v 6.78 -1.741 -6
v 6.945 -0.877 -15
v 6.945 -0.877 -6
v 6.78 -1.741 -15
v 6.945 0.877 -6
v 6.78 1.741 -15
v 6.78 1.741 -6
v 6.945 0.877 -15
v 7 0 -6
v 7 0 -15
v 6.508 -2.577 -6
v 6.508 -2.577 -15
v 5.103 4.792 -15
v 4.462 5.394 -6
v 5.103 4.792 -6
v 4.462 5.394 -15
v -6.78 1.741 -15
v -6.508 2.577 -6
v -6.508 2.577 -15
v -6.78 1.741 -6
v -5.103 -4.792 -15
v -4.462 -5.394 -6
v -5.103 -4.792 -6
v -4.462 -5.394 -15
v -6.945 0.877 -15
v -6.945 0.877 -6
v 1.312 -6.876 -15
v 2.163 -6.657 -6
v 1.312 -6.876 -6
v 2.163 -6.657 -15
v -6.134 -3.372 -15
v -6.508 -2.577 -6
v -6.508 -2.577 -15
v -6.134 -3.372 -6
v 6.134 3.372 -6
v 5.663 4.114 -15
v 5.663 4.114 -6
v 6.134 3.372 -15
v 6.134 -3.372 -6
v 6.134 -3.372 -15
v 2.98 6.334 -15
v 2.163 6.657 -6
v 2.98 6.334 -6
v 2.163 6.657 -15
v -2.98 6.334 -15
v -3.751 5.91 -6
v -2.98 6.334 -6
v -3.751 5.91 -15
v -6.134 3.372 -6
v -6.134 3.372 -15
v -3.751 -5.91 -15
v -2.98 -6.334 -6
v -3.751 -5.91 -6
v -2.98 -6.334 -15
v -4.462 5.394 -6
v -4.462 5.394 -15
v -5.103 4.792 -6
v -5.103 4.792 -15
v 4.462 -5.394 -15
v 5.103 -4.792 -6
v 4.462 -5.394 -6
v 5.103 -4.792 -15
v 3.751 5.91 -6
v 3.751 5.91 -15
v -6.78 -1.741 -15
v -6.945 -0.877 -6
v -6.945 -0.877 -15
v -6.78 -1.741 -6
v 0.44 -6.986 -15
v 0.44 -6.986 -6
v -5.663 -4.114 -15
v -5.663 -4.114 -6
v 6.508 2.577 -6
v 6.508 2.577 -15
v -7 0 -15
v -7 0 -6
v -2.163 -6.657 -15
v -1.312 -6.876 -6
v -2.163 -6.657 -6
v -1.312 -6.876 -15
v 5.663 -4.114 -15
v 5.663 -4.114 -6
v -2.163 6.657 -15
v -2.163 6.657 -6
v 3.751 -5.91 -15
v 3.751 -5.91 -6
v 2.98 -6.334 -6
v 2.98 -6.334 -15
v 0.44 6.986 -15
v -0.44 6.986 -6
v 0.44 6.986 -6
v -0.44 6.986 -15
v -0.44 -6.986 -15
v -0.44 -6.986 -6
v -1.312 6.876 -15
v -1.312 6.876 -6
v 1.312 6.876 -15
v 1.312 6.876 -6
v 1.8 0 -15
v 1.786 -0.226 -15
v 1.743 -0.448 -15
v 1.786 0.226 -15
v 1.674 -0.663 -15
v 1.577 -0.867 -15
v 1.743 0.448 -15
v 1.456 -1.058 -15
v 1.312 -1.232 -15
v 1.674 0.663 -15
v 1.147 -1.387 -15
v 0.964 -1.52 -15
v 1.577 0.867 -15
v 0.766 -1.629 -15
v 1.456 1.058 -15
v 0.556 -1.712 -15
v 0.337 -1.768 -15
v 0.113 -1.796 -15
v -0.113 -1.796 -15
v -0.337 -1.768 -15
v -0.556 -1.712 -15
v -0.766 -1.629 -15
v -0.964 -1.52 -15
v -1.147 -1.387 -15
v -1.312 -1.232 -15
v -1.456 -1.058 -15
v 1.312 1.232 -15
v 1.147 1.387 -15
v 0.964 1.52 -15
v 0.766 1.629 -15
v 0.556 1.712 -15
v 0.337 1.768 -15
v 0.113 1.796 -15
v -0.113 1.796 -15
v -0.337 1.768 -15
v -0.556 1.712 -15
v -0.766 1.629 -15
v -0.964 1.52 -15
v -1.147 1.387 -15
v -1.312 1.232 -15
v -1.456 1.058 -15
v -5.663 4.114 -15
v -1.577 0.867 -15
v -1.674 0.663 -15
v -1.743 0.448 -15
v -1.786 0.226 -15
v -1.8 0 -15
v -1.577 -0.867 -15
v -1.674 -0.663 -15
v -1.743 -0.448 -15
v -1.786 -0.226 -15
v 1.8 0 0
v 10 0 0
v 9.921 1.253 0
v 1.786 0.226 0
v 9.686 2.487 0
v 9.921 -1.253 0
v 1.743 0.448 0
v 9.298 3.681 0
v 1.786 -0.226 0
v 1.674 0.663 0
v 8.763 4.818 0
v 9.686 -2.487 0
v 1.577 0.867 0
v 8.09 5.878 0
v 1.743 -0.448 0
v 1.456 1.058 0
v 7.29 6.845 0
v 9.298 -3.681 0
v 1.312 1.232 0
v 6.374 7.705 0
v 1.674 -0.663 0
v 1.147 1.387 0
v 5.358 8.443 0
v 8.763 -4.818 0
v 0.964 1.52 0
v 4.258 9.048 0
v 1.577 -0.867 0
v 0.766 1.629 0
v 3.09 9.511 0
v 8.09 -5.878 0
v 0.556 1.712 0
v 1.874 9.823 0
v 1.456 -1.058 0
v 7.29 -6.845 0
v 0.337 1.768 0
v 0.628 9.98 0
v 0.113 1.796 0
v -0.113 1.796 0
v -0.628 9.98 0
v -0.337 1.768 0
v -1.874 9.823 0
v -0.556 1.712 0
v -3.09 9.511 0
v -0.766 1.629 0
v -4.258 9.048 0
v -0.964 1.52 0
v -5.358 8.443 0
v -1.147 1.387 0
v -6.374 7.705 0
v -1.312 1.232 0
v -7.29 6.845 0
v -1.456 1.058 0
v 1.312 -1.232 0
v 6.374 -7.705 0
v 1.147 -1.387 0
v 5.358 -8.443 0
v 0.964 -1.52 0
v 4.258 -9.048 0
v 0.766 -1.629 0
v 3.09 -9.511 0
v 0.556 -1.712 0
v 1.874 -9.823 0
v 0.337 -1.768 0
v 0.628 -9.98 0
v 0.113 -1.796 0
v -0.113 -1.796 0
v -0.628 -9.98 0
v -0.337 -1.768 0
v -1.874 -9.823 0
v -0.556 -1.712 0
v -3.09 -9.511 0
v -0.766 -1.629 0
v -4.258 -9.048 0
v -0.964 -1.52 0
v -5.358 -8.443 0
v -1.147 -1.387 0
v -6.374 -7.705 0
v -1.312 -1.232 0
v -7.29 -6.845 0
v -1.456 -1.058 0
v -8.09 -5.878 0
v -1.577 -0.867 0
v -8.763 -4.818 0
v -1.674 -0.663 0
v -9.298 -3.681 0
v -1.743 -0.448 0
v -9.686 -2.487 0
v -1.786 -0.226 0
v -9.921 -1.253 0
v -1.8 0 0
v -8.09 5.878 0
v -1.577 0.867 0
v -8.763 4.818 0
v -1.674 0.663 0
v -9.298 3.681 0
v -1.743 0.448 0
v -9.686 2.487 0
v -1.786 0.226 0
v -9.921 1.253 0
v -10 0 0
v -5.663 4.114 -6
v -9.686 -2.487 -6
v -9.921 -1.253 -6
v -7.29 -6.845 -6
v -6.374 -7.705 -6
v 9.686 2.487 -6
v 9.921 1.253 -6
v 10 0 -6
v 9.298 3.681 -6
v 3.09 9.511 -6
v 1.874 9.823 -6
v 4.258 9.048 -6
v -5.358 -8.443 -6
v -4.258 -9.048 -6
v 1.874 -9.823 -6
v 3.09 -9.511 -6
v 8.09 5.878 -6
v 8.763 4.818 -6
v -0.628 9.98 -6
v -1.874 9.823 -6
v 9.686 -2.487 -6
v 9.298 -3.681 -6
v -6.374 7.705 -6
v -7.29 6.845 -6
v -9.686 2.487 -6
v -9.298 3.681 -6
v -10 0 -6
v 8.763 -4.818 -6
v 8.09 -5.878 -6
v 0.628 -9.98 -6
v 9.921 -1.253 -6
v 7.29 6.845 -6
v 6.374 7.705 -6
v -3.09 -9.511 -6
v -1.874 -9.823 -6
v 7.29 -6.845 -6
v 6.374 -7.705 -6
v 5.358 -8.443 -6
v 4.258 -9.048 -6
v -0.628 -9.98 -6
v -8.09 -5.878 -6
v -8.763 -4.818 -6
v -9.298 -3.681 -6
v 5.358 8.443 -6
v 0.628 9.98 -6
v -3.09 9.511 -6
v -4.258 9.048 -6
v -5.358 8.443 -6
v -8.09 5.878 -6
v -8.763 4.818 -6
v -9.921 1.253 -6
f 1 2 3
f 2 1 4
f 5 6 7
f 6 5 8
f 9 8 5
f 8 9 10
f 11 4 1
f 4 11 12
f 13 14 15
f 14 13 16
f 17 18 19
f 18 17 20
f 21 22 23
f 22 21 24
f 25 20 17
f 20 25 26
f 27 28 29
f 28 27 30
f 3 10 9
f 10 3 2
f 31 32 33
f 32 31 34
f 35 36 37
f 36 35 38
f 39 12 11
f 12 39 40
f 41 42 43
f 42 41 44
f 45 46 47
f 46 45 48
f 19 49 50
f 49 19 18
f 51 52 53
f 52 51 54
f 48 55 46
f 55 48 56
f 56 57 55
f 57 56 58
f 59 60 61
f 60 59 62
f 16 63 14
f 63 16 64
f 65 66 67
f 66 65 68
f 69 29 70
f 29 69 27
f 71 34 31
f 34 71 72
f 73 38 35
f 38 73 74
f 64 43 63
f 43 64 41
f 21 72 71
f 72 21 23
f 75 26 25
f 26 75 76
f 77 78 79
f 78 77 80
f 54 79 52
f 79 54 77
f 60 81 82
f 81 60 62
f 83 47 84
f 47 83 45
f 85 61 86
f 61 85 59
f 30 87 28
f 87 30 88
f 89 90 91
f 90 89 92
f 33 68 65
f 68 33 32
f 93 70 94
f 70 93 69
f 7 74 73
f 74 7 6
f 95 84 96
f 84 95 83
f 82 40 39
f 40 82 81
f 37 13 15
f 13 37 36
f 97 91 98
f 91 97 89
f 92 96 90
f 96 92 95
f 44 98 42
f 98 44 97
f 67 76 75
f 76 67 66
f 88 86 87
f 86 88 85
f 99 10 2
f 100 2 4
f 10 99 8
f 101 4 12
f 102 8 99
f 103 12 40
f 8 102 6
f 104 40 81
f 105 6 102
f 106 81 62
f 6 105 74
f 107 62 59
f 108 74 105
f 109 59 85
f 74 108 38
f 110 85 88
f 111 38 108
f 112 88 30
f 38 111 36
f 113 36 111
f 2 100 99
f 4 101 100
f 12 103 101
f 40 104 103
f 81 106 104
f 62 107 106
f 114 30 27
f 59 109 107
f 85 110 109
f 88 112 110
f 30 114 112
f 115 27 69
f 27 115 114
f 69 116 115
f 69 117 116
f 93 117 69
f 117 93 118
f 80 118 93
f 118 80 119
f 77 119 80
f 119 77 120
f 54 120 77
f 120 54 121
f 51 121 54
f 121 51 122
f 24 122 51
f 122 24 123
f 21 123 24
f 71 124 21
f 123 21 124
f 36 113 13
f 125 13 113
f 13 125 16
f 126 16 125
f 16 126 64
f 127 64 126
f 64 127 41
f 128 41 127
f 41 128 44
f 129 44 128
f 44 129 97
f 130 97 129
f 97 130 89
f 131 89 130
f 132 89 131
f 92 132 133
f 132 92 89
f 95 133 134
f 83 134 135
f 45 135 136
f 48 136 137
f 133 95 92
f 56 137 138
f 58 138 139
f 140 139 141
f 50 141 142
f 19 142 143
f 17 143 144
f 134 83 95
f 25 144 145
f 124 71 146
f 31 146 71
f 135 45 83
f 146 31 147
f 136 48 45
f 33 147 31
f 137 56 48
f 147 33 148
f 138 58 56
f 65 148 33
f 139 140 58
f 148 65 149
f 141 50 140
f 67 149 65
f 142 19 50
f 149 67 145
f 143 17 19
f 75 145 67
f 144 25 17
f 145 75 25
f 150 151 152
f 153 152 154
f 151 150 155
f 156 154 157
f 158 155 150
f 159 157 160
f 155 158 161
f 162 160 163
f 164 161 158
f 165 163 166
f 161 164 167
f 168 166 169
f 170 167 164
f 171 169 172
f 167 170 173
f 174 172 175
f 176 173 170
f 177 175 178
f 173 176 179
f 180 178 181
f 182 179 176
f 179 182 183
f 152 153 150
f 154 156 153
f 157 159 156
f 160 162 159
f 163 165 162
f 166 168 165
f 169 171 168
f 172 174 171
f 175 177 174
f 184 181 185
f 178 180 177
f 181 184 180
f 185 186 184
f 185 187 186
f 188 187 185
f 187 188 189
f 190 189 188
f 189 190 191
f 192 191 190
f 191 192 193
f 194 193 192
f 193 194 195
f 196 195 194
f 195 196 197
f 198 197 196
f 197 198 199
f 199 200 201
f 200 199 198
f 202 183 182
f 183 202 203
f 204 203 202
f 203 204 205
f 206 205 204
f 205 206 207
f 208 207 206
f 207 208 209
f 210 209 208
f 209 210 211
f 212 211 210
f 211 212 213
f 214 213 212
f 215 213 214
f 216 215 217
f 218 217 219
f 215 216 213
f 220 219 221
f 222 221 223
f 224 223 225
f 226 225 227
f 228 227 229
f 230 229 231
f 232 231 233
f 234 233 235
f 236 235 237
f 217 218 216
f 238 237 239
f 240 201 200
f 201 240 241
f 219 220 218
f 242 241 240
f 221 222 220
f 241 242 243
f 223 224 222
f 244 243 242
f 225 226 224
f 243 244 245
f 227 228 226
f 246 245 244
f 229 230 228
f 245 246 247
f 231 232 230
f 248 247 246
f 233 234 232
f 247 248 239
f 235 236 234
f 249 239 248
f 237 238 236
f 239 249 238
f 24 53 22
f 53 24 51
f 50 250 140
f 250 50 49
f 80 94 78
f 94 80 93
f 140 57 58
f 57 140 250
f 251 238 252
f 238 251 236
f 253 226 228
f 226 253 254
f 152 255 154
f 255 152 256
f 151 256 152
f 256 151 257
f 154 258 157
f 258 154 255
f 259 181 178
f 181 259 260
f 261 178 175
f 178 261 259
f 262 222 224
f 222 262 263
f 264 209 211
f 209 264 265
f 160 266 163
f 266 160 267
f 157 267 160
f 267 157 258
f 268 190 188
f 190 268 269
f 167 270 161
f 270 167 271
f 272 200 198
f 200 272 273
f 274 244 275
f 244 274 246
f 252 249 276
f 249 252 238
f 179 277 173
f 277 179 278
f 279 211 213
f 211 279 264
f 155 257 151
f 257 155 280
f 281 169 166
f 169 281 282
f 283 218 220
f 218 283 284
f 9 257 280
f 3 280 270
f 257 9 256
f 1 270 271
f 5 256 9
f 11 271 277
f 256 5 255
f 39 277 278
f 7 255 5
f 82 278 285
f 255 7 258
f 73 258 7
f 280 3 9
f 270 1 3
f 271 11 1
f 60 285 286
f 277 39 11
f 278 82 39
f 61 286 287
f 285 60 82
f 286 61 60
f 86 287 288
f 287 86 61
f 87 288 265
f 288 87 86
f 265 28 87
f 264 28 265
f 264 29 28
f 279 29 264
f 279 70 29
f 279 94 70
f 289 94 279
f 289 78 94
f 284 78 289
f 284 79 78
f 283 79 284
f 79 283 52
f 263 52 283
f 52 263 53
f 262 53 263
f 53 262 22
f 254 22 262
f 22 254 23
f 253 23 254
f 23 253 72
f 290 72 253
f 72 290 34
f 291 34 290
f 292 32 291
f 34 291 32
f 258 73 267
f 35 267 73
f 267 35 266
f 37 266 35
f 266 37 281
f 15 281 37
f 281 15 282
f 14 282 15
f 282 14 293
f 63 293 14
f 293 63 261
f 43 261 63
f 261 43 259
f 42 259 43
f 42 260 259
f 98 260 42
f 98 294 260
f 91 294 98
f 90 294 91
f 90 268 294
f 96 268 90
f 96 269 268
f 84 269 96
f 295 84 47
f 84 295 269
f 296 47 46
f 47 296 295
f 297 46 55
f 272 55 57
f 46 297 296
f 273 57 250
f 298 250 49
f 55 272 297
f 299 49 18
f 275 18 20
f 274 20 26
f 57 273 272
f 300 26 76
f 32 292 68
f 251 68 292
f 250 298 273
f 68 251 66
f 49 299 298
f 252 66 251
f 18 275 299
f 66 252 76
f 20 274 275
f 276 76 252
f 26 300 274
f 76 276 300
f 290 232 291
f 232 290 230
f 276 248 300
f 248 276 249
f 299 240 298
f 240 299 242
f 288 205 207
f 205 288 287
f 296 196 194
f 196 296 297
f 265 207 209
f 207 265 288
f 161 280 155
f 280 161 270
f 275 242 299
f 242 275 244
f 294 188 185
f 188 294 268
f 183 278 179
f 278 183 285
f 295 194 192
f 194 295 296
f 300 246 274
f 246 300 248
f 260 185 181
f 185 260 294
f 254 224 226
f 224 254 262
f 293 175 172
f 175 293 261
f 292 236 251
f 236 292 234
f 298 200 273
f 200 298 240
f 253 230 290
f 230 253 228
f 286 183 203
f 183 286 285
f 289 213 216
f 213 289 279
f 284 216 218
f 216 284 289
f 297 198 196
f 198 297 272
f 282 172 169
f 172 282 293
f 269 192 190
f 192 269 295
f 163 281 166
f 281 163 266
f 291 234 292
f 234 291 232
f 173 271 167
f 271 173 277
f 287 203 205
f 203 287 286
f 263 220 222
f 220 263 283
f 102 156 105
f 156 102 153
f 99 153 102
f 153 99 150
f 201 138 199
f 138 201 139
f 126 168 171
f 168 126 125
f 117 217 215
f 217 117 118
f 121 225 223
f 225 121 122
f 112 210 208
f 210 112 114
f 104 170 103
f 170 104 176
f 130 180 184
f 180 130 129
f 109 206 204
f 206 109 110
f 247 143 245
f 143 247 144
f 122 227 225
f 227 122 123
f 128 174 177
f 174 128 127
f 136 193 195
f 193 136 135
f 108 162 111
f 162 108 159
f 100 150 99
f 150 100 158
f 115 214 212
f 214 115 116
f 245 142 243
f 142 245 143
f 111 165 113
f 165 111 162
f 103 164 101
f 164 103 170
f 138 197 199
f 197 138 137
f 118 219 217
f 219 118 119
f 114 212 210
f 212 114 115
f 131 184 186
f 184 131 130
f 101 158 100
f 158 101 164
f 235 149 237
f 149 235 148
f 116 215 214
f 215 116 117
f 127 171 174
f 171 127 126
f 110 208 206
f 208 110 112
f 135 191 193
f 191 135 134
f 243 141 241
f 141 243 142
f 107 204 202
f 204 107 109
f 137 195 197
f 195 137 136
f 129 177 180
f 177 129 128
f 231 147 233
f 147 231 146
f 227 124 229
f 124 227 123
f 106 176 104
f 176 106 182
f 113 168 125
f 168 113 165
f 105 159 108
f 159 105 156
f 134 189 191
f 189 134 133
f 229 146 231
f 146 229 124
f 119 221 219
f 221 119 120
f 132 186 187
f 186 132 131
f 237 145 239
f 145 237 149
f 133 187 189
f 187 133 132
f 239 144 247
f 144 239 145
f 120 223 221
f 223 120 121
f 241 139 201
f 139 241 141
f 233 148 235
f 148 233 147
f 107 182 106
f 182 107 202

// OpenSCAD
$fn = 50;


difference() {
	union() {
		translate(v = [0, 0, -15.0000000000]) {
			cylinder(h = 15, r = 7.0000000000);
		}
		translate(v = [0, 0, -6.0000000000]) {
			cylinder(h = 6, r = 10.0000000000);
		}
	}
	union() {
		#translate(v = [0, 0, -15]) {
			cylinder(h = 15, r = 1.8000000000);
		}
	}
}
